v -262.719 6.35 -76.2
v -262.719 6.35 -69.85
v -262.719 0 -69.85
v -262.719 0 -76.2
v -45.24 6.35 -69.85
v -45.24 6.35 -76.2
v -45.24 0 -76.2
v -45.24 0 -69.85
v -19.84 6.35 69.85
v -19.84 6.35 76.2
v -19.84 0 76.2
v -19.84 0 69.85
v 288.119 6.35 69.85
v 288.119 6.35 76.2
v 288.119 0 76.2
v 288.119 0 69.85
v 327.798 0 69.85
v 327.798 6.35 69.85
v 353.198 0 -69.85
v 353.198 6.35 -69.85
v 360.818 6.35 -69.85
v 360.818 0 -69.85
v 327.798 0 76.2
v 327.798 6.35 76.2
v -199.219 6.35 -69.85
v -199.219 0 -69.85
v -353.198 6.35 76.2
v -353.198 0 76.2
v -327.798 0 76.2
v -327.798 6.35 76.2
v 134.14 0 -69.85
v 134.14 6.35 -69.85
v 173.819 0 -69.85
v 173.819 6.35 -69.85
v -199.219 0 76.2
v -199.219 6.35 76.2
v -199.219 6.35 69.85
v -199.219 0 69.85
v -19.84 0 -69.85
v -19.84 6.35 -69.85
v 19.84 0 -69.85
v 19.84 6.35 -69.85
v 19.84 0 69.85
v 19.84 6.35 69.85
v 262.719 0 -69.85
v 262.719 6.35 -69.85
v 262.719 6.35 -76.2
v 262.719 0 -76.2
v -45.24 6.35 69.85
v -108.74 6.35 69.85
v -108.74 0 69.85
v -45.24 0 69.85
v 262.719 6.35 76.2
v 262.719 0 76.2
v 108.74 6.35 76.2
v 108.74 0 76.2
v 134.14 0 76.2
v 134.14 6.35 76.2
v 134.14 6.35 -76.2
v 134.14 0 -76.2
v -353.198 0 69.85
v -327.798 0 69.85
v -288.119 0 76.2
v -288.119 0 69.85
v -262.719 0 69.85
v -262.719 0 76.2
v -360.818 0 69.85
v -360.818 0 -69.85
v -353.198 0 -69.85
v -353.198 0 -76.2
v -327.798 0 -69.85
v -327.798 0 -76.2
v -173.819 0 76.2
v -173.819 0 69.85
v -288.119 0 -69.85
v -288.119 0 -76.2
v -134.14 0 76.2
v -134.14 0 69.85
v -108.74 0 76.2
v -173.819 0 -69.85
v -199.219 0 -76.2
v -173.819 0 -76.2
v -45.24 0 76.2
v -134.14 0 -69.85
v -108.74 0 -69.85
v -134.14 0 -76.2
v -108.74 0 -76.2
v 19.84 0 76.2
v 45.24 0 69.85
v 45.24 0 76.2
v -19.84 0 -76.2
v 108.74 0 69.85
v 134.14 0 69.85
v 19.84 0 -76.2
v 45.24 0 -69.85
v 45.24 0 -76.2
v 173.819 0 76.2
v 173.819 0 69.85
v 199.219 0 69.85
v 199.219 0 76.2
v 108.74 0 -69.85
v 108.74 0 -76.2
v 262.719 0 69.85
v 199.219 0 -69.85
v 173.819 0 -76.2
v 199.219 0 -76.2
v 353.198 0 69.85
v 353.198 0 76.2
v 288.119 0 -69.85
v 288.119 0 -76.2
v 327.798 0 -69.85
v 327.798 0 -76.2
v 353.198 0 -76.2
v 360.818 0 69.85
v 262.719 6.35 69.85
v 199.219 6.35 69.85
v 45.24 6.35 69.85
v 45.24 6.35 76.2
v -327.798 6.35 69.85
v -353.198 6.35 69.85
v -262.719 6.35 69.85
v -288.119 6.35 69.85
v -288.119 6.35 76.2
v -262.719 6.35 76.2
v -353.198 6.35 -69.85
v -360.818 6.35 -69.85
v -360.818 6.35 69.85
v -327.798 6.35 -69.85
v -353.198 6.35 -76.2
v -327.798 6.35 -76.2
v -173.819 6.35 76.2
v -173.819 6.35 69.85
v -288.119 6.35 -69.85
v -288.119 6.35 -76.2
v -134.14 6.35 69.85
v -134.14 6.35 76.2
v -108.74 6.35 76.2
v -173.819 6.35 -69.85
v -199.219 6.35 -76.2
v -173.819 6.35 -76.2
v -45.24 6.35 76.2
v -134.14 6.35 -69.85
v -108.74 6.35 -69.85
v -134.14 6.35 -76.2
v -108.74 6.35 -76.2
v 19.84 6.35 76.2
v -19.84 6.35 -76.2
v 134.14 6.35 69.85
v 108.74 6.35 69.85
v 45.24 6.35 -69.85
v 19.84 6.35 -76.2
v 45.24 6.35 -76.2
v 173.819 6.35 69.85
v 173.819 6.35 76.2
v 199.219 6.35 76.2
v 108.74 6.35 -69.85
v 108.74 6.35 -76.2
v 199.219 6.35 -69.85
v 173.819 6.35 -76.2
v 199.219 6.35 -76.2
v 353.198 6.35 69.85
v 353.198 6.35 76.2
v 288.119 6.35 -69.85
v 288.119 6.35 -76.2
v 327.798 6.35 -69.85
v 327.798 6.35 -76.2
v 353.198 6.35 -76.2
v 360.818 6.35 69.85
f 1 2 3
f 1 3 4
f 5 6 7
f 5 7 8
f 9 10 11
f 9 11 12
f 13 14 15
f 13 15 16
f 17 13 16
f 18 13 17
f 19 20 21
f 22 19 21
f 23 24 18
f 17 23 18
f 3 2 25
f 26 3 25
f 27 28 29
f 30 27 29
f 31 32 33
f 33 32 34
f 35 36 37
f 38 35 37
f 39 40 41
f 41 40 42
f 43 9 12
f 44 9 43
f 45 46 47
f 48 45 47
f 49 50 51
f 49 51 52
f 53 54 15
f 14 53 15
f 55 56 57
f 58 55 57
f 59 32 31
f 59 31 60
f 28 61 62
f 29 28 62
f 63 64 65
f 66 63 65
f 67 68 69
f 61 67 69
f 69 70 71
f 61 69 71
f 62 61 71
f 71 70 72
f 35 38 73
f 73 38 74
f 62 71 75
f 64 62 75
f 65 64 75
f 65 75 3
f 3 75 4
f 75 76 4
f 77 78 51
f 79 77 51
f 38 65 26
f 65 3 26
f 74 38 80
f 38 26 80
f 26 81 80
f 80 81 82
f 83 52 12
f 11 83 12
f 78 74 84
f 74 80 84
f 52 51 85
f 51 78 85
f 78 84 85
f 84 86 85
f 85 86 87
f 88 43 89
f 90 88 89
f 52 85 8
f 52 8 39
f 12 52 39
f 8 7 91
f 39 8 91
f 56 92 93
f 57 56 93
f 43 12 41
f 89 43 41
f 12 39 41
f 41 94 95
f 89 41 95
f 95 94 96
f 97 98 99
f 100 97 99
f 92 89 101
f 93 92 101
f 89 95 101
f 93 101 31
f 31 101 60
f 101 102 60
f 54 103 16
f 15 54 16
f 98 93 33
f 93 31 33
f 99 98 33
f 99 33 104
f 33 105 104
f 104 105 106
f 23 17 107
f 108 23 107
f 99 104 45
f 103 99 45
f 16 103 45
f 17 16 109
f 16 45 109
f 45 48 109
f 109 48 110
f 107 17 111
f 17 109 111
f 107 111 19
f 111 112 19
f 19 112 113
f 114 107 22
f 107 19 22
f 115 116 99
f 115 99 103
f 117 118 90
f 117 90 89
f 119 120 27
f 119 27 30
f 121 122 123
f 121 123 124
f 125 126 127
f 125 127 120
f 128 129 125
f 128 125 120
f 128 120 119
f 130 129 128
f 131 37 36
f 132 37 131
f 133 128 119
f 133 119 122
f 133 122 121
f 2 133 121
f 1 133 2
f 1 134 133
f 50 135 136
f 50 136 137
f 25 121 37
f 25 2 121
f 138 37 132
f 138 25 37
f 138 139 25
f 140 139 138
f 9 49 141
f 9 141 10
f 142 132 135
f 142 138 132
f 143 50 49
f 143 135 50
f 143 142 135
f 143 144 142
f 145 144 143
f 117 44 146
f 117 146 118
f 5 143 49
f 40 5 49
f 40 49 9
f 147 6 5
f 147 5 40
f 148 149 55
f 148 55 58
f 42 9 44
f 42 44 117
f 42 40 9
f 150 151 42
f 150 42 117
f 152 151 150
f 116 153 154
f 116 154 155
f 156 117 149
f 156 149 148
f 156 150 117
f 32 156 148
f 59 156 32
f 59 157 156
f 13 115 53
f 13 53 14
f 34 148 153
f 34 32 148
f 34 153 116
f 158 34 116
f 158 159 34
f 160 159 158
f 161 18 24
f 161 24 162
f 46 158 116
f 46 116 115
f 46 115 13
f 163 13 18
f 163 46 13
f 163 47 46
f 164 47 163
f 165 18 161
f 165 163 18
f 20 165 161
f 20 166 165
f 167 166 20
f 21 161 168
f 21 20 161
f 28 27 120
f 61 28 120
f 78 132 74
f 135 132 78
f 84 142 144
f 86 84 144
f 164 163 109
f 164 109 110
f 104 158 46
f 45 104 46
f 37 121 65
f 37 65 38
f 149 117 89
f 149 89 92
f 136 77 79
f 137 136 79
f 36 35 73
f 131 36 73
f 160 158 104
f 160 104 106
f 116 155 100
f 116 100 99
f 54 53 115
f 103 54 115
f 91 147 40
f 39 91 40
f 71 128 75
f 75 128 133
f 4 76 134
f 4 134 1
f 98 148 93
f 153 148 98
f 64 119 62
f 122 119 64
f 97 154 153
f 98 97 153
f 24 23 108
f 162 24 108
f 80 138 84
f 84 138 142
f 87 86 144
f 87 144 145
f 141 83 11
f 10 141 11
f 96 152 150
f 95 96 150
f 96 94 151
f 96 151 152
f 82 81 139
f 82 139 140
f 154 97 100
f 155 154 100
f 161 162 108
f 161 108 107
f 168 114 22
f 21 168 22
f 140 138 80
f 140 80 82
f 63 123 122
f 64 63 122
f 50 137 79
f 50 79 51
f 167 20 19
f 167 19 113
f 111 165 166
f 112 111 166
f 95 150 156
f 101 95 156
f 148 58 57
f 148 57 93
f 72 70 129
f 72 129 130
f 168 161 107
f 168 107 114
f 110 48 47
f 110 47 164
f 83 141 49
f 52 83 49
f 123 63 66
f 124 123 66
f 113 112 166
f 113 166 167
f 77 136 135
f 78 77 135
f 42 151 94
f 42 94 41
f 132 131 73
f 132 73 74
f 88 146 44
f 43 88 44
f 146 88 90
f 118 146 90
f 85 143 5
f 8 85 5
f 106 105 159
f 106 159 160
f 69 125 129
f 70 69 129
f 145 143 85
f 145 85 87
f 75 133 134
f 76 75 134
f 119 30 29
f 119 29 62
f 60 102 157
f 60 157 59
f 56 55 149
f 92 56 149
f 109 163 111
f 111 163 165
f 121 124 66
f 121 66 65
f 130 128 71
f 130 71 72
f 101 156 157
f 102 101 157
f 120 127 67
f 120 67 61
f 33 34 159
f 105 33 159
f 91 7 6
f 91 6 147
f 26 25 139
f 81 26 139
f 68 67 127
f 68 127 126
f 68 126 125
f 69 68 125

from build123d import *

# Parameters (mm, degrees)
SKETCH1_W                 = 721.63658441
SKETCH1_H                 = 152.4
BOSS_EXTRUDE1_DEPTH       = 6.35
SKETCH2_W                 = 39.679316882
SKETCH2_H                 = 6.35
SKETCH2_W_2               = 31.750000127
CUT_EXTRUDE1_DEPTH        = 7.35
LPATTERN1_COUNT           = 3
LPATTERN1_PITCH           = 153.979316882
LPATTERN1_COL_COUNT       = 3
LPATTERN1_COL_PITCH       = 153.979316882
MIRROR1_COPY_1_SKETCH_W   = 39.679316882
MIRROR1_COPY_1_SKETCH_H   = 6.35
MIRROR1_COPY_1_SKETCH_W_2 = 31.750000127
MIRROR1_COPY_1_DEPTH      = 7.35
MIRROR1_COPY_2_SKETCH_W   = 39.679316882
MIRROR1_COPY_2_SKETCH_H   = 6.35
MIRROR1_COPY_2_SKETCH_W_2 = 31.750000127
MIRROR1_COPY_2_DEPTH      = 7.35
MIRROR1_COPY_3_SKETCH_W   = 39.679316882
MIRROR1_COPY_3_SKETCH_H   = 6.35
MIRROR1_COPY_3_SKETCH_W_2 = 31.750000127
MIRROR1_COPY_3_DEPTH      = 7.35
MIRROR1_COPY_4_SKETCH_W   = 39.679316882
MIRROR1_COPY_4_SKETCH_H   = 6.35
MIRROR1_COPY_4_SKETCH_W_2 = 31.750000127
MIRROR1_COPY_4_DEPTH      = 7.35


with BuildPart() as part:
    # Sketch1 → Boss-Extrude1 (new body)
    with BuildSketch(Plane(origin=(0, 0, 0), x_dir=(1, 0, 0), z_dir=(0, 1, 0))):
        Rectangle(SKETCH1_W, SKETCH1_H)
    extrude(amount=BOSS_EXTRUDE1_DEPTH)

    # Sketch2 → Cut-Extrude1 (cut, through all)
    with BuildSketch(Plane(origin=(0, 6.35, 0), x_dir=(1, 0, 0), z_dir=(0, 1, 0))):
        with Locations((0, -73.025)):
            Rectangle(SKETCH2_W, SKETCH2_H)
        with Locations((-61.114658505, -73.025)):
            Rectangle(SKETCH2_W_2, SKETCH2_H)
        with Locations((61.114658505, -73.025)):
            Rectangle(SKETCH2_W_2, SKETCH2_H)
    cut_extrude1 = extrude(amount=-CUT_EXTRUDE1_DEPTH, mode=Mode.SUBTRACT)

    # LPattern1: Cut-Extrude1 ×3
    with Locations(*[(i * LPATTERN1_PITCH, 0, 0) for i in range(1, LPATTERN1_COUNT)]):
        add(cut_extrude1, mode=Mode.SUBTRACT)

    # LPattern1 col: Cut-Extrude1 ×3
    with Locations(*[(-i * LPATTERN1_COL_PITCH, 0, 0) for i in range(1, LPATTERN1_COL_COUNT)]):
        add(cut_extrude1, mode=Mode.SUBTRACT)

    # Mirror1: Cut-Extrude1 across plane
    add(cut_extrude1.mirror(Plane.XY), mode=Mode.SUBTRACT)

    # Mirror1 copy 1 sketch → Mirror1 copy 1 (cut, through all)
    with BuildSketch(Plane(origin=(153.979316882, 6.35, 0), x_dir=(1, 0, 0), z_dir=(0, 1, 0))):
        with Locations((0, 73.025)):
            Rectangle(MIRROR1_COPY_1_SKETCH_W, MIRROR1_COPY_1_SKETCH_H)
        with Locations((-61.114658505, 73.025)):
            Rectangle(MIRROR1_COPY_1_SKETCH_W_2, MIRROR1_COPY_1_SKETCH_H)
        with Locations((61.114658505, 73.025)):
            Rectangle(MIRROR1_COPY_1_SKETCH_W_2, MIRROR1_COPY_1_SKETCH_H)
    extrude(amount=-MIRROR1_COPY_1_DEPTH, mode=Mode.SUBTRACT)

    # Mirror1 copy 2 sketch → Mirror1 copy 2 (cut, through all)
    with BuildSketch(Plane(origin=(307.958633764, 6.35, 0), x_dir=(1, 0, 0), z_dir=(0, 1, 0))):
        with Locations((0, 73.025)):
            Rectangle(MIRROR1_COPY_2_SKETCH_W, MIRROR1_COPY_2_SKETCH_H)
        with Locations((-61.114658505, 73.025)):
            Rectangle(MIRROR1_COPY_2_SKETCH_W_2, MIRROR1_COPY_2_SKETCH_H)
        with Locations((61.114658505, 73.025)):
            Rectangle(MIRROR1_COPY_2_SKETCH_W_2, MIRROR1_COPY_2_SKETCH_H)
    extrude(amount=-MIRROR1_COPY_2_DEPTH, mode=Mode.SUBTRACT)

    # Mirror1 copy 3 sketch → Mirror1 copy 3 (cut, through all)
    with BuildSketch(Plane(origin=(-153.979316882, 6.35, 0), x_dir=(1, 0, 0), z_dir=(0, 1, 0))):
        with Locations((0, 73.025)):
            Rectangle(MIRROR1_COPY_3_SKETCH_W, MIRROR1_COPY_3_SKETCH_H)
        with Locations((-61.114658505, 73.025)):
            Rectangle(MIRROR1_COPY_3_SKETCH_W_2, MIRROR1_COPY_3_SKETCH_H)
        with Locations((61.114658505, 73.025)):
            Rectangle(MIRROR1_COPY_3_SKETCH_W_2, MIRROR1_COPY_3_SKETCH_H)
    extrude(amount=-MIRROR1_COPY_3_DEPTH, mode=Mode.SUBTRACT)

    # Mirror1 copy 4 sketch → Mirror1 copy 4 (cut, through all)
    with BuildSketch(Plane(origin=(-307.958633764, 6.35, 0), x_dir=(1, 0, 0), z_dir=(0, 1, 0))):
        with Locations((0, 73.025)):
            Rectangle(MIRROR1_COPY_4_SKETCH_W, MIRROR1_COPY_4_SKETCH_H)
        with Locations((-61.114658505, 73.025)):
            Rectangle(MIRROR1_COPY_4_SKETCH_W_2, MIRROR1_COPY_4_SKETCH_H)
        with Locations((61.114658505, 73.025)):
            Rectangle(MIRROR1_COPY_4_SKETCH_W_2, MIRROR1_COPY_4_SKETCH_H)
    extrude(amount=-MIRROR1_COPY_4_DEPTH, mode=Mode.SUBTRACT)


solid = part.part
